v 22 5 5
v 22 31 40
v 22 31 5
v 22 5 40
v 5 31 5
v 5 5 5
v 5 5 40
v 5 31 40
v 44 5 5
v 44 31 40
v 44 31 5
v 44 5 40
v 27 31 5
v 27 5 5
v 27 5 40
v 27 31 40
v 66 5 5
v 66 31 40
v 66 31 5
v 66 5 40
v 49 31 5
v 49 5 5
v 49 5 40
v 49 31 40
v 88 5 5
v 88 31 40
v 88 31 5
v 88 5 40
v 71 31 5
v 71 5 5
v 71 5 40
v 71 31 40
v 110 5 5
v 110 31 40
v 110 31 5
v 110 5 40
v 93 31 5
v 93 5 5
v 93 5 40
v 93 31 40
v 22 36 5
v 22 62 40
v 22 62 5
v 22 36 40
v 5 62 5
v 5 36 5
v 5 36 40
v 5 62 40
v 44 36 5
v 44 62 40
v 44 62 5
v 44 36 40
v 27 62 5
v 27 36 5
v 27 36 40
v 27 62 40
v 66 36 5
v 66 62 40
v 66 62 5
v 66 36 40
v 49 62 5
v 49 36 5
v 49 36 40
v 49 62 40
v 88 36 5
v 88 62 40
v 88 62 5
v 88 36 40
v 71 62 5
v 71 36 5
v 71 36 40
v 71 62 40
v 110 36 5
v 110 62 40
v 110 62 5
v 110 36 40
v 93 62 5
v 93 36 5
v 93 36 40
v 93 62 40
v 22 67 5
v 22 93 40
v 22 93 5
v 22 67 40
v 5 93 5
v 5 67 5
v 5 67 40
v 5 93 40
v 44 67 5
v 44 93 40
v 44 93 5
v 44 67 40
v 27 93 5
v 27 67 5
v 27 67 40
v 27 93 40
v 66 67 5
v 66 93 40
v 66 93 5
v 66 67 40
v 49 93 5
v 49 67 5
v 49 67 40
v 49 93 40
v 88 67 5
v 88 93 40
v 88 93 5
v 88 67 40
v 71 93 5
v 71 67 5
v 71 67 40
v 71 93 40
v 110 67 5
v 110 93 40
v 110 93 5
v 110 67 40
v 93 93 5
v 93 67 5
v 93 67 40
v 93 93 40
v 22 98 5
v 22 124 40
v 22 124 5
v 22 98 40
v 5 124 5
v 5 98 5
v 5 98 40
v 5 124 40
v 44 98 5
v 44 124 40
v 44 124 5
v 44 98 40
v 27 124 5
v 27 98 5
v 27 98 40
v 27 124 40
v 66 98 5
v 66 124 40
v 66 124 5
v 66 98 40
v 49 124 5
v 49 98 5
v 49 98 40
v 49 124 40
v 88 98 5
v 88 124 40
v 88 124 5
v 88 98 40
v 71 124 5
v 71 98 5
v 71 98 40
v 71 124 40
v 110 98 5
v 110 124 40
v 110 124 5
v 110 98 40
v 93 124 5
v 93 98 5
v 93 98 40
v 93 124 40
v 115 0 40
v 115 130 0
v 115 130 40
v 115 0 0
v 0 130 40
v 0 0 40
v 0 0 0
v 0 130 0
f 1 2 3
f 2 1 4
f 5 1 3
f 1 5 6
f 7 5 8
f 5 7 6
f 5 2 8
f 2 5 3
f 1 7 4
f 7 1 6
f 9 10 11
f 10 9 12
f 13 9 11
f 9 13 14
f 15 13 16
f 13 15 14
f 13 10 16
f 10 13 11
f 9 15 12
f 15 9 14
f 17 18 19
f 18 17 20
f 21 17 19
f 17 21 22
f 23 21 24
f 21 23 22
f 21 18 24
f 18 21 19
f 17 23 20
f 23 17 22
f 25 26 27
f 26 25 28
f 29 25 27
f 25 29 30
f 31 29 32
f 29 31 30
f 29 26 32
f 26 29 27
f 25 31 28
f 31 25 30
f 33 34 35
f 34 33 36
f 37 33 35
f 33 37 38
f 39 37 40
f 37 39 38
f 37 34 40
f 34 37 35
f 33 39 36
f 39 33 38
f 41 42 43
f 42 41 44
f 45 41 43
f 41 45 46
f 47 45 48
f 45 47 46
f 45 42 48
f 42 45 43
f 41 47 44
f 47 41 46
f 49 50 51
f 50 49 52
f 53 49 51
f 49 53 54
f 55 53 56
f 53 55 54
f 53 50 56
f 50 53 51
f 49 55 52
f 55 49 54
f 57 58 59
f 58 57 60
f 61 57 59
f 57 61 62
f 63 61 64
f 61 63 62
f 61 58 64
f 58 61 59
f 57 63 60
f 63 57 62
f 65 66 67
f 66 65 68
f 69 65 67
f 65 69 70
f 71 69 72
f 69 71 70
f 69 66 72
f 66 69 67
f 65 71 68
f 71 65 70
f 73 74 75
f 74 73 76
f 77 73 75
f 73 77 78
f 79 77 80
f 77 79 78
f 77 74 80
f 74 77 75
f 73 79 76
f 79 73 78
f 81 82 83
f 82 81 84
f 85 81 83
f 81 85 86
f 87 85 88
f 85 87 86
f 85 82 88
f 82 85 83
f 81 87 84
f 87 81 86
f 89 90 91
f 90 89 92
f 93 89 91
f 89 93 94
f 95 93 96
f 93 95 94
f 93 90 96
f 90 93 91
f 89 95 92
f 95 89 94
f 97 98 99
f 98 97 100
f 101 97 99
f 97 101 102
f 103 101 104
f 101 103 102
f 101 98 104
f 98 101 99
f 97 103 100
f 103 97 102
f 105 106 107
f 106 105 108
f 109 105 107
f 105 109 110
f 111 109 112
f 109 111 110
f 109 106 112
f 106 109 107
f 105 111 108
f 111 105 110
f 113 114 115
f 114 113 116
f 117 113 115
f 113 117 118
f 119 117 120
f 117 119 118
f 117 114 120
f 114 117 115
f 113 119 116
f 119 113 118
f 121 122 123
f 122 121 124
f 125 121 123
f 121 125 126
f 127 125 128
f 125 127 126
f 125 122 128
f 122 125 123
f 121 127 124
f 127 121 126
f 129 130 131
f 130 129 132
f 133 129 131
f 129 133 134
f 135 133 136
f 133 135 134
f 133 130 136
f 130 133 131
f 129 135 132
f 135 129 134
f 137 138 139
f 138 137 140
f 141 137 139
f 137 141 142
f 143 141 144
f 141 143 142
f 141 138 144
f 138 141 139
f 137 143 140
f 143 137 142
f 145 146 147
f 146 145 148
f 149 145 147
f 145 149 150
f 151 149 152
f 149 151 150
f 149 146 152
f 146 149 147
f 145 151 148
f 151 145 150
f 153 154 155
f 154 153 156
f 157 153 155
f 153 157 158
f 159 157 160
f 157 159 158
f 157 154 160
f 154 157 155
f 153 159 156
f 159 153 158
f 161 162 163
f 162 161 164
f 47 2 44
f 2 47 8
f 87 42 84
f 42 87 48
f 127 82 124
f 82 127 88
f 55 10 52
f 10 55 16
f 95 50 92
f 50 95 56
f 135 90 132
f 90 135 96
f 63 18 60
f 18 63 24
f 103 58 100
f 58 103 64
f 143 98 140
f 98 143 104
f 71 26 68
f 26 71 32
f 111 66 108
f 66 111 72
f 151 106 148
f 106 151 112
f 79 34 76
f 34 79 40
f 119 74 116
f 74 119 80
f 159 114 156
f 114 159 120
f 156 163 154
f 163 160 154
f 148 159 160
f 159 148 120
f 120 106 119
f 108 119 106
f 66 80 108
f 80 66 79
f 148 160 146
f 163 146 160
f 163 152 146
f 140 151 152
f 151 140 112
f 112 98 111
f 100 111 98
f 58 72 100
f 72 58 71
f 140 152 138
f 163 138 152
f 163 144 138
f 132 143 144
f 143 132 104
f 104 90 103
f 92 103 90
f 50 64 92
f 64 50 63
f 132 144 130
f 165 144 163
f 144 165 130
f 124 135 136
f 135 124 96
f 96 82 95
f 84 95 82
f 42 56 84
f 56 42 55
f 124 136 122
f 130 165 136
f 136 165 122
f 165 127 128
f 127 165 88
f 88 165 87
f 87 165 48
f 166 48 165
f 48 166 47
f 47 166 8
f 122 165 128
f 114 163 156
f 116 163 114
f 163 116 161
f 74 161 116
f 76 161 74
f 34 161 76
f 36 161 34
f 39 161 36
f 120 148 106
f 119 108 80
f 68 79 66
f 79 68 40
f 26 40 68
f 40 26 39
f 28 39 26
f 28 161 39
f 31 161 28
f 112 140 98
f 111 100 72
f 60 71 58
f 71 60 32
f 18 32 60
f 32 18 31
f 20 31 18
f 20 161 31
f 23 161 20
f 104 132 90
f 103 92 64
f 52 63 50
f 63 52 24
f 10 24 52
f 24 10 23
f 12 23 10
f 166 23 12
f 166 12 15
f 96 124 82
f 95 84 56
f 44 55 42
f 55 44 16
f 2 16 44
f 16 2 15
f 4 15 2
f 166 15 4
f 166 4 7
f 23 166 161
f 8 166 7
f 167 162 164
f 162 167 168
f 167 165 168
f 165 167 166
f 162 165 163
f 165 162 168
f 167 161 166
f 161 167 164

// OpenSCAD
BoxZ=40;
BoxY=130;
BoxX=115;
BatteryD=26;
BatteryW=17;
BatteryH=45;
Space=5;
BoxWall=5;
BoxFloor=5;
CS=(BatteryD/2)+BoxWall;
MaxX=BoxX-BatteryW-BoxWall;
MaxY=BoxY-BatteryD-BoxWall;

difference()
{
  cube([BoxX,BoxY,BoxZ]);
  for (y=[BoxWall:BatteryD+Space:MaxY])
  {
    for (x=[BoxWall:BatteryW+Space:MaxX])
    {
      translate([x,y,BoxFloor]) cube([BatteryW,BatteryD,BatteryH]);
      
    }
  }
}
